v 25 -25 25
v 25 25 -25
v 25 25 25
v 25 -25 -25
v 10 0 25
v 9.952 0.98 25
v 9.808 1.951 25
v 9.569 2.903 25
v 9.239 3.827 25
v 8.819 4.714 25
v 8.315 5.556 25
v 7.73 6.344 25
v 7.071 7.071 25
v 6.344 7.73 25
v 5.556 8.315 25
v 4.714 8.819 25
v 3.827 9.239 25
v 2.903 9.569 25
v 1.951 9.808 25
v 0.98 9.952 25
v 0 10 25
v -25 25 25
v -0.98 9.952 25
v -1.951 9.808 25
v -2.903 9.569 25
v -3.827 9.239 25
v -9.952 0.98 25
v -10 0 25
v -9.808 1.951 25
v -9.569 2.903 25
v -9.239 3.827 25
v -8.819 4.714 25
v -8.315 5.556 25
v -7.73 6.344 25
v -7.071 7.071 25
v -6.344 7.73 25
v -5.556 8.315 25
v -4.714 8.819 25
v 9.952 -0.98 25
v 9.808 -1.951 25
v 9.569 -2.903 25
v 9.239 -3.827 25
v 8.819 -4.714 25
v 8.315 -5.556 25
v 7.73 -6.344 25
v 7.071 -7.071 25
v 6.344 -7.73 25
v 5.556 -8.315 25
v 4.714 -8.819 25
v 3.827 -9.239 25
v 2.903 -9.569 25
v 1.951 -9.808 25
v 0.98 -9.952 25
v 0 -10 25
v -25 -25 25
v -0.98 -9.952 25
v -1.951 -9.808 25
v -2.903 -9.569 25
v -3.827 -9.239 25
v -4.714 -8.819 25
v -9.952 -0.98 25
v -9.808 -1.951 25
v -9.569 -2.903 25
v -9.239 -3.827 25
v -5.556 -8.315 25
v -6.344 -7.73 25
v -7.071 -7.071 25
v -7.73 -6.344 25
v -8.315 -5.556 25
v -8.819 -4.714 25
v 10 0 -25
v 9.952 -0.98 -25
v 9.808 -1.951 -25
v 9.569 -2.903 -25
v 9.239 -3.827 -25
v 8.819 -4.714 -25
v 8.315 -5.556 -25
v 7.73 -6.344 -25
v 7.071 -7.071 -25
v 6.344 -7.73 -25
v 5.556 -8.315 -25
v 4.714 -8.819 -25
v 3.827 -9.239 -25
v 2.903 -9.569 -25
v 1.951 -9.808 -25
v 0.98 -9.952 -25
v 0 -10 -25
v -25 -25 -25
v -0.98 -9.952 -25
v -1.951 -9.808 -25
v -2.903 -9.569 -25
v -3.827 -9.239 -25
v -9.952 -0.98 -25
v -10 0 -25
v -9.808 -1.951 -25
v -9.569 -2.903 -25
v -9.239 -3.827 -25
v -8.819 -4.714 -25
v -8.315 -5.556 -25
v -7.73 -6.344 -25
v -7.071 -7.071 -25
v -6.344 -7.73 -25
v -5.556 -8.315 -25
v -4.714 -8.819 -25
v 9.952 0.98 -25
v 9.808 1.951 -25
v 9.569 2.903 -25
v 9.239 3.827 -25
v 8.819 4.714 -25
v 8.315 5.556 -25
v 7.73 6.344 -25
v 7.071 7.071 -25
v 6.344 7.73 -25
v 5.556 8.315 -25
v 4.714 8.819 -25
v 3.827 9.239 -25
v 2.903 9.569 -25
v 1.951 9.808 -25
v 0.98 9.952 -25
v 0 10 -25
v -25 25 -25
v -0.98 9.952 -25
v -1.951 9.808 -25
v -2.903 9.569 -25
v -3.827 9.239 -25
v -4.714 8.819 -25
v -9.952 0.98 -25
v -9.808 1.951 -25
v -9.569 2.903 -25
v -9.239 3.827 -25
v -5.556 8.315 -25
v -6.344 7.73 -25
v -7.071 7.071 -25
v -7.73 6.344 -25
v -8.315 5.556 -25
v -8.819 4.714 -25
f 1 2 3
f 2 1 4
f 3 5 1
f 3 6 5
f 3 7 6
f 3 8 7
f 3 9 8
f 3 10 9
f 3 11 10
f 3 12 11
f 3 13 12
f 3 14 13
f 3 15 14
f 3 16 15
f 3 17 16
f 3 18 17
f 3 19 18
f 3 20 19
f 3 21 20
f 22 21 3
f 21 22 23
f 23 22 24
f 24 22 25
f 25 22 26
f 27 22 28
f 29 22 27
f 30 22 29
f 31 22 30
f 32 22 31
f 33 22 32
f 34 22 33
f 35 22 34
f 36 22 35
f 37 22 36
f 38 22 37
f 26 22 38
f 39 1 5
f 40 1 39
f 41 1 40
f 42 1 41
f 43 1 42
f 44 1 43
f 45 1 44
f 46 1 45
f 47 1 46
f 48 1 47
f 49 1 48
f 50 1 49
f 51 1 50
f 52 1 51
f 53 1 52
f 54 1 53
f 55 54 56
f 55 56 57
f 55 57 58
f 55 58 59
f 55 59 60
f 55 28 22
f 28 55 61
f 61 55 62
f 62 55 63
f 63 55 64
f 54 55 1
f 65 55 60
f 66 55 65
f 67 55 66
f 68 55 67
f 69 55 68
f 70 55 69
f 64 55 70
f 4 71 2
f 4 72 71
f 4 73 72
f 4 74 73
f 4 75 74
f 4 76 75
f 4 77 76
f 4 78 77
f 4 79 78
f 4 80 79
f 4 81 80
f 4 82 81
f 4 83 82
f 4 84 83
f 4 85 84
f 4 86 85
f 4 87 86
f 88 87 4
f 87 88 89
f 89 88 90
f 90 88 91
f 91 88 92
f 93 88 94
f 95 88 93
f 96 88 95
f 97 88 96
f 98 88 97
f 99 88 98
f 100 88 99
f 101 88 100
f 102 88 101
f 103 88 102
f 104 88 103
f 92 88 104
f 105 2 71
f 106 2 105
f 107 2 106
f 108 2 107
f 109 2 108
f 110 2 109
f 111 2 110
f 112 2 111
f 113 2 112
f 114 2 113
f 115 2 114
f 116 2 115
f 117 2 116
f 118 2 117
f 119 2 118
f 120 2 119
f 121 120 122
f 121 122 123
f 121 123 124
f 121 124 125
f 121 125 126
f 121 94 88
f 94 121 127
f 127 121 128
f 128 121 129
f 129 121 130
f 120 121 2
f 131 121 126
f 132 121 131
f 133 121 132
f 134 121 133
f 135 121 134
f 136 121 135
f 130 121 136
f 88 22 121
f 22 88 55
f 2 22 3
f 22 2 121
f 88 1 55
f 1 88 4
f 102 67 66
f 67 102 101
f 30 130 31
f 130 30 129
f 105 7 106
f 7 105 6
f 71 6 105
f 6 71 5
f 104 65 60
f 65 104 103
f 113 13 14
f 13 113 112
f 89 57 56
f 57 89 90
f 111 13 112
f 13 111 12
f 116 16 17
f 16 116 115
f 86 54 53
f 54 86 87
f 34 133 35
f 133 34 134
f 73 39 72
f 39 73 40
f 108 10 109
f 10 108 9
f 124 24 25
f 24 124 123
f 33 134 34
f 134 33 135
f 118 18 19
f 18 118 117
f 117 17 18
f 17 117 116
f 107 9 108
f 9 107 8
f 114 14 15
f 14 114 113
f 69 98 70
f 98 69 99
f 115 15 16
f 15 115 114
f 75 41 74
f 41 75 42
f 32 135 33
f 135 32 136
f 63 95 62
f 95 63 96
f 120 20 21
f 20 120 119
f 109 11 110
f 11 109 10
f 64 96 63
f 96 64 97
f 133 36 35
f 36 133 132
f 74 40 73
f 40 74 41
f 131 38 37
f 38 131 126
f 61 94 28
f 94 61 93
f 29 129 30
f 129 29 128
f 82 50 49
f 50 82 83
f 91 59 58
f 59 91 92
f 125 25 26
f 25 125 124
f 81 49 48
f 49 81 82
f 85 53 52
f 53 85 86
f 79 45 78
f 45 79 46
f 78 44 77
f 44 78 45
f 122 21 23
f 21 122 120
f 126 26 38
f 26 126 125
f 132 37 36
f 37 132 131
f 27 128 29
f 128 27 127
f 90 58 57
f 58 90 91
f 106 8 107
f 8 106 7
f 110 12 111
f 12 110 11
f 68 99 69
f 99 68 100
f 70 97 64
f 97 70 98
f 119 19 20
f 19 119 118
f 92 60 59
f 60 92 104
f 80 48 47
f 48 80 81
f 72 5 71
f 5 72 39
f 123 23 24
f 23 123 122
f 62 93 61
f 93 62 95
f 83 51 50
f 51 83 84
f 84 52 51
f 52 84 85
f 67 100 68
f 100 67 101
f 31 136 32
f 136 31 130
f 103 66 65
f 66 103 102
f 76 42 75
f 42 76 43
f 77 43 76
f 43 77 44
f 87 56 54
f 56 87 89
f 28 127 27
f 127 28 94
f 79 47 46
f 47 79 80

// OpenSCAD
difference() {
    cube(50, center = true);
    cylinder(h = 52, d = 20, center = true, $fn = 64);
}
